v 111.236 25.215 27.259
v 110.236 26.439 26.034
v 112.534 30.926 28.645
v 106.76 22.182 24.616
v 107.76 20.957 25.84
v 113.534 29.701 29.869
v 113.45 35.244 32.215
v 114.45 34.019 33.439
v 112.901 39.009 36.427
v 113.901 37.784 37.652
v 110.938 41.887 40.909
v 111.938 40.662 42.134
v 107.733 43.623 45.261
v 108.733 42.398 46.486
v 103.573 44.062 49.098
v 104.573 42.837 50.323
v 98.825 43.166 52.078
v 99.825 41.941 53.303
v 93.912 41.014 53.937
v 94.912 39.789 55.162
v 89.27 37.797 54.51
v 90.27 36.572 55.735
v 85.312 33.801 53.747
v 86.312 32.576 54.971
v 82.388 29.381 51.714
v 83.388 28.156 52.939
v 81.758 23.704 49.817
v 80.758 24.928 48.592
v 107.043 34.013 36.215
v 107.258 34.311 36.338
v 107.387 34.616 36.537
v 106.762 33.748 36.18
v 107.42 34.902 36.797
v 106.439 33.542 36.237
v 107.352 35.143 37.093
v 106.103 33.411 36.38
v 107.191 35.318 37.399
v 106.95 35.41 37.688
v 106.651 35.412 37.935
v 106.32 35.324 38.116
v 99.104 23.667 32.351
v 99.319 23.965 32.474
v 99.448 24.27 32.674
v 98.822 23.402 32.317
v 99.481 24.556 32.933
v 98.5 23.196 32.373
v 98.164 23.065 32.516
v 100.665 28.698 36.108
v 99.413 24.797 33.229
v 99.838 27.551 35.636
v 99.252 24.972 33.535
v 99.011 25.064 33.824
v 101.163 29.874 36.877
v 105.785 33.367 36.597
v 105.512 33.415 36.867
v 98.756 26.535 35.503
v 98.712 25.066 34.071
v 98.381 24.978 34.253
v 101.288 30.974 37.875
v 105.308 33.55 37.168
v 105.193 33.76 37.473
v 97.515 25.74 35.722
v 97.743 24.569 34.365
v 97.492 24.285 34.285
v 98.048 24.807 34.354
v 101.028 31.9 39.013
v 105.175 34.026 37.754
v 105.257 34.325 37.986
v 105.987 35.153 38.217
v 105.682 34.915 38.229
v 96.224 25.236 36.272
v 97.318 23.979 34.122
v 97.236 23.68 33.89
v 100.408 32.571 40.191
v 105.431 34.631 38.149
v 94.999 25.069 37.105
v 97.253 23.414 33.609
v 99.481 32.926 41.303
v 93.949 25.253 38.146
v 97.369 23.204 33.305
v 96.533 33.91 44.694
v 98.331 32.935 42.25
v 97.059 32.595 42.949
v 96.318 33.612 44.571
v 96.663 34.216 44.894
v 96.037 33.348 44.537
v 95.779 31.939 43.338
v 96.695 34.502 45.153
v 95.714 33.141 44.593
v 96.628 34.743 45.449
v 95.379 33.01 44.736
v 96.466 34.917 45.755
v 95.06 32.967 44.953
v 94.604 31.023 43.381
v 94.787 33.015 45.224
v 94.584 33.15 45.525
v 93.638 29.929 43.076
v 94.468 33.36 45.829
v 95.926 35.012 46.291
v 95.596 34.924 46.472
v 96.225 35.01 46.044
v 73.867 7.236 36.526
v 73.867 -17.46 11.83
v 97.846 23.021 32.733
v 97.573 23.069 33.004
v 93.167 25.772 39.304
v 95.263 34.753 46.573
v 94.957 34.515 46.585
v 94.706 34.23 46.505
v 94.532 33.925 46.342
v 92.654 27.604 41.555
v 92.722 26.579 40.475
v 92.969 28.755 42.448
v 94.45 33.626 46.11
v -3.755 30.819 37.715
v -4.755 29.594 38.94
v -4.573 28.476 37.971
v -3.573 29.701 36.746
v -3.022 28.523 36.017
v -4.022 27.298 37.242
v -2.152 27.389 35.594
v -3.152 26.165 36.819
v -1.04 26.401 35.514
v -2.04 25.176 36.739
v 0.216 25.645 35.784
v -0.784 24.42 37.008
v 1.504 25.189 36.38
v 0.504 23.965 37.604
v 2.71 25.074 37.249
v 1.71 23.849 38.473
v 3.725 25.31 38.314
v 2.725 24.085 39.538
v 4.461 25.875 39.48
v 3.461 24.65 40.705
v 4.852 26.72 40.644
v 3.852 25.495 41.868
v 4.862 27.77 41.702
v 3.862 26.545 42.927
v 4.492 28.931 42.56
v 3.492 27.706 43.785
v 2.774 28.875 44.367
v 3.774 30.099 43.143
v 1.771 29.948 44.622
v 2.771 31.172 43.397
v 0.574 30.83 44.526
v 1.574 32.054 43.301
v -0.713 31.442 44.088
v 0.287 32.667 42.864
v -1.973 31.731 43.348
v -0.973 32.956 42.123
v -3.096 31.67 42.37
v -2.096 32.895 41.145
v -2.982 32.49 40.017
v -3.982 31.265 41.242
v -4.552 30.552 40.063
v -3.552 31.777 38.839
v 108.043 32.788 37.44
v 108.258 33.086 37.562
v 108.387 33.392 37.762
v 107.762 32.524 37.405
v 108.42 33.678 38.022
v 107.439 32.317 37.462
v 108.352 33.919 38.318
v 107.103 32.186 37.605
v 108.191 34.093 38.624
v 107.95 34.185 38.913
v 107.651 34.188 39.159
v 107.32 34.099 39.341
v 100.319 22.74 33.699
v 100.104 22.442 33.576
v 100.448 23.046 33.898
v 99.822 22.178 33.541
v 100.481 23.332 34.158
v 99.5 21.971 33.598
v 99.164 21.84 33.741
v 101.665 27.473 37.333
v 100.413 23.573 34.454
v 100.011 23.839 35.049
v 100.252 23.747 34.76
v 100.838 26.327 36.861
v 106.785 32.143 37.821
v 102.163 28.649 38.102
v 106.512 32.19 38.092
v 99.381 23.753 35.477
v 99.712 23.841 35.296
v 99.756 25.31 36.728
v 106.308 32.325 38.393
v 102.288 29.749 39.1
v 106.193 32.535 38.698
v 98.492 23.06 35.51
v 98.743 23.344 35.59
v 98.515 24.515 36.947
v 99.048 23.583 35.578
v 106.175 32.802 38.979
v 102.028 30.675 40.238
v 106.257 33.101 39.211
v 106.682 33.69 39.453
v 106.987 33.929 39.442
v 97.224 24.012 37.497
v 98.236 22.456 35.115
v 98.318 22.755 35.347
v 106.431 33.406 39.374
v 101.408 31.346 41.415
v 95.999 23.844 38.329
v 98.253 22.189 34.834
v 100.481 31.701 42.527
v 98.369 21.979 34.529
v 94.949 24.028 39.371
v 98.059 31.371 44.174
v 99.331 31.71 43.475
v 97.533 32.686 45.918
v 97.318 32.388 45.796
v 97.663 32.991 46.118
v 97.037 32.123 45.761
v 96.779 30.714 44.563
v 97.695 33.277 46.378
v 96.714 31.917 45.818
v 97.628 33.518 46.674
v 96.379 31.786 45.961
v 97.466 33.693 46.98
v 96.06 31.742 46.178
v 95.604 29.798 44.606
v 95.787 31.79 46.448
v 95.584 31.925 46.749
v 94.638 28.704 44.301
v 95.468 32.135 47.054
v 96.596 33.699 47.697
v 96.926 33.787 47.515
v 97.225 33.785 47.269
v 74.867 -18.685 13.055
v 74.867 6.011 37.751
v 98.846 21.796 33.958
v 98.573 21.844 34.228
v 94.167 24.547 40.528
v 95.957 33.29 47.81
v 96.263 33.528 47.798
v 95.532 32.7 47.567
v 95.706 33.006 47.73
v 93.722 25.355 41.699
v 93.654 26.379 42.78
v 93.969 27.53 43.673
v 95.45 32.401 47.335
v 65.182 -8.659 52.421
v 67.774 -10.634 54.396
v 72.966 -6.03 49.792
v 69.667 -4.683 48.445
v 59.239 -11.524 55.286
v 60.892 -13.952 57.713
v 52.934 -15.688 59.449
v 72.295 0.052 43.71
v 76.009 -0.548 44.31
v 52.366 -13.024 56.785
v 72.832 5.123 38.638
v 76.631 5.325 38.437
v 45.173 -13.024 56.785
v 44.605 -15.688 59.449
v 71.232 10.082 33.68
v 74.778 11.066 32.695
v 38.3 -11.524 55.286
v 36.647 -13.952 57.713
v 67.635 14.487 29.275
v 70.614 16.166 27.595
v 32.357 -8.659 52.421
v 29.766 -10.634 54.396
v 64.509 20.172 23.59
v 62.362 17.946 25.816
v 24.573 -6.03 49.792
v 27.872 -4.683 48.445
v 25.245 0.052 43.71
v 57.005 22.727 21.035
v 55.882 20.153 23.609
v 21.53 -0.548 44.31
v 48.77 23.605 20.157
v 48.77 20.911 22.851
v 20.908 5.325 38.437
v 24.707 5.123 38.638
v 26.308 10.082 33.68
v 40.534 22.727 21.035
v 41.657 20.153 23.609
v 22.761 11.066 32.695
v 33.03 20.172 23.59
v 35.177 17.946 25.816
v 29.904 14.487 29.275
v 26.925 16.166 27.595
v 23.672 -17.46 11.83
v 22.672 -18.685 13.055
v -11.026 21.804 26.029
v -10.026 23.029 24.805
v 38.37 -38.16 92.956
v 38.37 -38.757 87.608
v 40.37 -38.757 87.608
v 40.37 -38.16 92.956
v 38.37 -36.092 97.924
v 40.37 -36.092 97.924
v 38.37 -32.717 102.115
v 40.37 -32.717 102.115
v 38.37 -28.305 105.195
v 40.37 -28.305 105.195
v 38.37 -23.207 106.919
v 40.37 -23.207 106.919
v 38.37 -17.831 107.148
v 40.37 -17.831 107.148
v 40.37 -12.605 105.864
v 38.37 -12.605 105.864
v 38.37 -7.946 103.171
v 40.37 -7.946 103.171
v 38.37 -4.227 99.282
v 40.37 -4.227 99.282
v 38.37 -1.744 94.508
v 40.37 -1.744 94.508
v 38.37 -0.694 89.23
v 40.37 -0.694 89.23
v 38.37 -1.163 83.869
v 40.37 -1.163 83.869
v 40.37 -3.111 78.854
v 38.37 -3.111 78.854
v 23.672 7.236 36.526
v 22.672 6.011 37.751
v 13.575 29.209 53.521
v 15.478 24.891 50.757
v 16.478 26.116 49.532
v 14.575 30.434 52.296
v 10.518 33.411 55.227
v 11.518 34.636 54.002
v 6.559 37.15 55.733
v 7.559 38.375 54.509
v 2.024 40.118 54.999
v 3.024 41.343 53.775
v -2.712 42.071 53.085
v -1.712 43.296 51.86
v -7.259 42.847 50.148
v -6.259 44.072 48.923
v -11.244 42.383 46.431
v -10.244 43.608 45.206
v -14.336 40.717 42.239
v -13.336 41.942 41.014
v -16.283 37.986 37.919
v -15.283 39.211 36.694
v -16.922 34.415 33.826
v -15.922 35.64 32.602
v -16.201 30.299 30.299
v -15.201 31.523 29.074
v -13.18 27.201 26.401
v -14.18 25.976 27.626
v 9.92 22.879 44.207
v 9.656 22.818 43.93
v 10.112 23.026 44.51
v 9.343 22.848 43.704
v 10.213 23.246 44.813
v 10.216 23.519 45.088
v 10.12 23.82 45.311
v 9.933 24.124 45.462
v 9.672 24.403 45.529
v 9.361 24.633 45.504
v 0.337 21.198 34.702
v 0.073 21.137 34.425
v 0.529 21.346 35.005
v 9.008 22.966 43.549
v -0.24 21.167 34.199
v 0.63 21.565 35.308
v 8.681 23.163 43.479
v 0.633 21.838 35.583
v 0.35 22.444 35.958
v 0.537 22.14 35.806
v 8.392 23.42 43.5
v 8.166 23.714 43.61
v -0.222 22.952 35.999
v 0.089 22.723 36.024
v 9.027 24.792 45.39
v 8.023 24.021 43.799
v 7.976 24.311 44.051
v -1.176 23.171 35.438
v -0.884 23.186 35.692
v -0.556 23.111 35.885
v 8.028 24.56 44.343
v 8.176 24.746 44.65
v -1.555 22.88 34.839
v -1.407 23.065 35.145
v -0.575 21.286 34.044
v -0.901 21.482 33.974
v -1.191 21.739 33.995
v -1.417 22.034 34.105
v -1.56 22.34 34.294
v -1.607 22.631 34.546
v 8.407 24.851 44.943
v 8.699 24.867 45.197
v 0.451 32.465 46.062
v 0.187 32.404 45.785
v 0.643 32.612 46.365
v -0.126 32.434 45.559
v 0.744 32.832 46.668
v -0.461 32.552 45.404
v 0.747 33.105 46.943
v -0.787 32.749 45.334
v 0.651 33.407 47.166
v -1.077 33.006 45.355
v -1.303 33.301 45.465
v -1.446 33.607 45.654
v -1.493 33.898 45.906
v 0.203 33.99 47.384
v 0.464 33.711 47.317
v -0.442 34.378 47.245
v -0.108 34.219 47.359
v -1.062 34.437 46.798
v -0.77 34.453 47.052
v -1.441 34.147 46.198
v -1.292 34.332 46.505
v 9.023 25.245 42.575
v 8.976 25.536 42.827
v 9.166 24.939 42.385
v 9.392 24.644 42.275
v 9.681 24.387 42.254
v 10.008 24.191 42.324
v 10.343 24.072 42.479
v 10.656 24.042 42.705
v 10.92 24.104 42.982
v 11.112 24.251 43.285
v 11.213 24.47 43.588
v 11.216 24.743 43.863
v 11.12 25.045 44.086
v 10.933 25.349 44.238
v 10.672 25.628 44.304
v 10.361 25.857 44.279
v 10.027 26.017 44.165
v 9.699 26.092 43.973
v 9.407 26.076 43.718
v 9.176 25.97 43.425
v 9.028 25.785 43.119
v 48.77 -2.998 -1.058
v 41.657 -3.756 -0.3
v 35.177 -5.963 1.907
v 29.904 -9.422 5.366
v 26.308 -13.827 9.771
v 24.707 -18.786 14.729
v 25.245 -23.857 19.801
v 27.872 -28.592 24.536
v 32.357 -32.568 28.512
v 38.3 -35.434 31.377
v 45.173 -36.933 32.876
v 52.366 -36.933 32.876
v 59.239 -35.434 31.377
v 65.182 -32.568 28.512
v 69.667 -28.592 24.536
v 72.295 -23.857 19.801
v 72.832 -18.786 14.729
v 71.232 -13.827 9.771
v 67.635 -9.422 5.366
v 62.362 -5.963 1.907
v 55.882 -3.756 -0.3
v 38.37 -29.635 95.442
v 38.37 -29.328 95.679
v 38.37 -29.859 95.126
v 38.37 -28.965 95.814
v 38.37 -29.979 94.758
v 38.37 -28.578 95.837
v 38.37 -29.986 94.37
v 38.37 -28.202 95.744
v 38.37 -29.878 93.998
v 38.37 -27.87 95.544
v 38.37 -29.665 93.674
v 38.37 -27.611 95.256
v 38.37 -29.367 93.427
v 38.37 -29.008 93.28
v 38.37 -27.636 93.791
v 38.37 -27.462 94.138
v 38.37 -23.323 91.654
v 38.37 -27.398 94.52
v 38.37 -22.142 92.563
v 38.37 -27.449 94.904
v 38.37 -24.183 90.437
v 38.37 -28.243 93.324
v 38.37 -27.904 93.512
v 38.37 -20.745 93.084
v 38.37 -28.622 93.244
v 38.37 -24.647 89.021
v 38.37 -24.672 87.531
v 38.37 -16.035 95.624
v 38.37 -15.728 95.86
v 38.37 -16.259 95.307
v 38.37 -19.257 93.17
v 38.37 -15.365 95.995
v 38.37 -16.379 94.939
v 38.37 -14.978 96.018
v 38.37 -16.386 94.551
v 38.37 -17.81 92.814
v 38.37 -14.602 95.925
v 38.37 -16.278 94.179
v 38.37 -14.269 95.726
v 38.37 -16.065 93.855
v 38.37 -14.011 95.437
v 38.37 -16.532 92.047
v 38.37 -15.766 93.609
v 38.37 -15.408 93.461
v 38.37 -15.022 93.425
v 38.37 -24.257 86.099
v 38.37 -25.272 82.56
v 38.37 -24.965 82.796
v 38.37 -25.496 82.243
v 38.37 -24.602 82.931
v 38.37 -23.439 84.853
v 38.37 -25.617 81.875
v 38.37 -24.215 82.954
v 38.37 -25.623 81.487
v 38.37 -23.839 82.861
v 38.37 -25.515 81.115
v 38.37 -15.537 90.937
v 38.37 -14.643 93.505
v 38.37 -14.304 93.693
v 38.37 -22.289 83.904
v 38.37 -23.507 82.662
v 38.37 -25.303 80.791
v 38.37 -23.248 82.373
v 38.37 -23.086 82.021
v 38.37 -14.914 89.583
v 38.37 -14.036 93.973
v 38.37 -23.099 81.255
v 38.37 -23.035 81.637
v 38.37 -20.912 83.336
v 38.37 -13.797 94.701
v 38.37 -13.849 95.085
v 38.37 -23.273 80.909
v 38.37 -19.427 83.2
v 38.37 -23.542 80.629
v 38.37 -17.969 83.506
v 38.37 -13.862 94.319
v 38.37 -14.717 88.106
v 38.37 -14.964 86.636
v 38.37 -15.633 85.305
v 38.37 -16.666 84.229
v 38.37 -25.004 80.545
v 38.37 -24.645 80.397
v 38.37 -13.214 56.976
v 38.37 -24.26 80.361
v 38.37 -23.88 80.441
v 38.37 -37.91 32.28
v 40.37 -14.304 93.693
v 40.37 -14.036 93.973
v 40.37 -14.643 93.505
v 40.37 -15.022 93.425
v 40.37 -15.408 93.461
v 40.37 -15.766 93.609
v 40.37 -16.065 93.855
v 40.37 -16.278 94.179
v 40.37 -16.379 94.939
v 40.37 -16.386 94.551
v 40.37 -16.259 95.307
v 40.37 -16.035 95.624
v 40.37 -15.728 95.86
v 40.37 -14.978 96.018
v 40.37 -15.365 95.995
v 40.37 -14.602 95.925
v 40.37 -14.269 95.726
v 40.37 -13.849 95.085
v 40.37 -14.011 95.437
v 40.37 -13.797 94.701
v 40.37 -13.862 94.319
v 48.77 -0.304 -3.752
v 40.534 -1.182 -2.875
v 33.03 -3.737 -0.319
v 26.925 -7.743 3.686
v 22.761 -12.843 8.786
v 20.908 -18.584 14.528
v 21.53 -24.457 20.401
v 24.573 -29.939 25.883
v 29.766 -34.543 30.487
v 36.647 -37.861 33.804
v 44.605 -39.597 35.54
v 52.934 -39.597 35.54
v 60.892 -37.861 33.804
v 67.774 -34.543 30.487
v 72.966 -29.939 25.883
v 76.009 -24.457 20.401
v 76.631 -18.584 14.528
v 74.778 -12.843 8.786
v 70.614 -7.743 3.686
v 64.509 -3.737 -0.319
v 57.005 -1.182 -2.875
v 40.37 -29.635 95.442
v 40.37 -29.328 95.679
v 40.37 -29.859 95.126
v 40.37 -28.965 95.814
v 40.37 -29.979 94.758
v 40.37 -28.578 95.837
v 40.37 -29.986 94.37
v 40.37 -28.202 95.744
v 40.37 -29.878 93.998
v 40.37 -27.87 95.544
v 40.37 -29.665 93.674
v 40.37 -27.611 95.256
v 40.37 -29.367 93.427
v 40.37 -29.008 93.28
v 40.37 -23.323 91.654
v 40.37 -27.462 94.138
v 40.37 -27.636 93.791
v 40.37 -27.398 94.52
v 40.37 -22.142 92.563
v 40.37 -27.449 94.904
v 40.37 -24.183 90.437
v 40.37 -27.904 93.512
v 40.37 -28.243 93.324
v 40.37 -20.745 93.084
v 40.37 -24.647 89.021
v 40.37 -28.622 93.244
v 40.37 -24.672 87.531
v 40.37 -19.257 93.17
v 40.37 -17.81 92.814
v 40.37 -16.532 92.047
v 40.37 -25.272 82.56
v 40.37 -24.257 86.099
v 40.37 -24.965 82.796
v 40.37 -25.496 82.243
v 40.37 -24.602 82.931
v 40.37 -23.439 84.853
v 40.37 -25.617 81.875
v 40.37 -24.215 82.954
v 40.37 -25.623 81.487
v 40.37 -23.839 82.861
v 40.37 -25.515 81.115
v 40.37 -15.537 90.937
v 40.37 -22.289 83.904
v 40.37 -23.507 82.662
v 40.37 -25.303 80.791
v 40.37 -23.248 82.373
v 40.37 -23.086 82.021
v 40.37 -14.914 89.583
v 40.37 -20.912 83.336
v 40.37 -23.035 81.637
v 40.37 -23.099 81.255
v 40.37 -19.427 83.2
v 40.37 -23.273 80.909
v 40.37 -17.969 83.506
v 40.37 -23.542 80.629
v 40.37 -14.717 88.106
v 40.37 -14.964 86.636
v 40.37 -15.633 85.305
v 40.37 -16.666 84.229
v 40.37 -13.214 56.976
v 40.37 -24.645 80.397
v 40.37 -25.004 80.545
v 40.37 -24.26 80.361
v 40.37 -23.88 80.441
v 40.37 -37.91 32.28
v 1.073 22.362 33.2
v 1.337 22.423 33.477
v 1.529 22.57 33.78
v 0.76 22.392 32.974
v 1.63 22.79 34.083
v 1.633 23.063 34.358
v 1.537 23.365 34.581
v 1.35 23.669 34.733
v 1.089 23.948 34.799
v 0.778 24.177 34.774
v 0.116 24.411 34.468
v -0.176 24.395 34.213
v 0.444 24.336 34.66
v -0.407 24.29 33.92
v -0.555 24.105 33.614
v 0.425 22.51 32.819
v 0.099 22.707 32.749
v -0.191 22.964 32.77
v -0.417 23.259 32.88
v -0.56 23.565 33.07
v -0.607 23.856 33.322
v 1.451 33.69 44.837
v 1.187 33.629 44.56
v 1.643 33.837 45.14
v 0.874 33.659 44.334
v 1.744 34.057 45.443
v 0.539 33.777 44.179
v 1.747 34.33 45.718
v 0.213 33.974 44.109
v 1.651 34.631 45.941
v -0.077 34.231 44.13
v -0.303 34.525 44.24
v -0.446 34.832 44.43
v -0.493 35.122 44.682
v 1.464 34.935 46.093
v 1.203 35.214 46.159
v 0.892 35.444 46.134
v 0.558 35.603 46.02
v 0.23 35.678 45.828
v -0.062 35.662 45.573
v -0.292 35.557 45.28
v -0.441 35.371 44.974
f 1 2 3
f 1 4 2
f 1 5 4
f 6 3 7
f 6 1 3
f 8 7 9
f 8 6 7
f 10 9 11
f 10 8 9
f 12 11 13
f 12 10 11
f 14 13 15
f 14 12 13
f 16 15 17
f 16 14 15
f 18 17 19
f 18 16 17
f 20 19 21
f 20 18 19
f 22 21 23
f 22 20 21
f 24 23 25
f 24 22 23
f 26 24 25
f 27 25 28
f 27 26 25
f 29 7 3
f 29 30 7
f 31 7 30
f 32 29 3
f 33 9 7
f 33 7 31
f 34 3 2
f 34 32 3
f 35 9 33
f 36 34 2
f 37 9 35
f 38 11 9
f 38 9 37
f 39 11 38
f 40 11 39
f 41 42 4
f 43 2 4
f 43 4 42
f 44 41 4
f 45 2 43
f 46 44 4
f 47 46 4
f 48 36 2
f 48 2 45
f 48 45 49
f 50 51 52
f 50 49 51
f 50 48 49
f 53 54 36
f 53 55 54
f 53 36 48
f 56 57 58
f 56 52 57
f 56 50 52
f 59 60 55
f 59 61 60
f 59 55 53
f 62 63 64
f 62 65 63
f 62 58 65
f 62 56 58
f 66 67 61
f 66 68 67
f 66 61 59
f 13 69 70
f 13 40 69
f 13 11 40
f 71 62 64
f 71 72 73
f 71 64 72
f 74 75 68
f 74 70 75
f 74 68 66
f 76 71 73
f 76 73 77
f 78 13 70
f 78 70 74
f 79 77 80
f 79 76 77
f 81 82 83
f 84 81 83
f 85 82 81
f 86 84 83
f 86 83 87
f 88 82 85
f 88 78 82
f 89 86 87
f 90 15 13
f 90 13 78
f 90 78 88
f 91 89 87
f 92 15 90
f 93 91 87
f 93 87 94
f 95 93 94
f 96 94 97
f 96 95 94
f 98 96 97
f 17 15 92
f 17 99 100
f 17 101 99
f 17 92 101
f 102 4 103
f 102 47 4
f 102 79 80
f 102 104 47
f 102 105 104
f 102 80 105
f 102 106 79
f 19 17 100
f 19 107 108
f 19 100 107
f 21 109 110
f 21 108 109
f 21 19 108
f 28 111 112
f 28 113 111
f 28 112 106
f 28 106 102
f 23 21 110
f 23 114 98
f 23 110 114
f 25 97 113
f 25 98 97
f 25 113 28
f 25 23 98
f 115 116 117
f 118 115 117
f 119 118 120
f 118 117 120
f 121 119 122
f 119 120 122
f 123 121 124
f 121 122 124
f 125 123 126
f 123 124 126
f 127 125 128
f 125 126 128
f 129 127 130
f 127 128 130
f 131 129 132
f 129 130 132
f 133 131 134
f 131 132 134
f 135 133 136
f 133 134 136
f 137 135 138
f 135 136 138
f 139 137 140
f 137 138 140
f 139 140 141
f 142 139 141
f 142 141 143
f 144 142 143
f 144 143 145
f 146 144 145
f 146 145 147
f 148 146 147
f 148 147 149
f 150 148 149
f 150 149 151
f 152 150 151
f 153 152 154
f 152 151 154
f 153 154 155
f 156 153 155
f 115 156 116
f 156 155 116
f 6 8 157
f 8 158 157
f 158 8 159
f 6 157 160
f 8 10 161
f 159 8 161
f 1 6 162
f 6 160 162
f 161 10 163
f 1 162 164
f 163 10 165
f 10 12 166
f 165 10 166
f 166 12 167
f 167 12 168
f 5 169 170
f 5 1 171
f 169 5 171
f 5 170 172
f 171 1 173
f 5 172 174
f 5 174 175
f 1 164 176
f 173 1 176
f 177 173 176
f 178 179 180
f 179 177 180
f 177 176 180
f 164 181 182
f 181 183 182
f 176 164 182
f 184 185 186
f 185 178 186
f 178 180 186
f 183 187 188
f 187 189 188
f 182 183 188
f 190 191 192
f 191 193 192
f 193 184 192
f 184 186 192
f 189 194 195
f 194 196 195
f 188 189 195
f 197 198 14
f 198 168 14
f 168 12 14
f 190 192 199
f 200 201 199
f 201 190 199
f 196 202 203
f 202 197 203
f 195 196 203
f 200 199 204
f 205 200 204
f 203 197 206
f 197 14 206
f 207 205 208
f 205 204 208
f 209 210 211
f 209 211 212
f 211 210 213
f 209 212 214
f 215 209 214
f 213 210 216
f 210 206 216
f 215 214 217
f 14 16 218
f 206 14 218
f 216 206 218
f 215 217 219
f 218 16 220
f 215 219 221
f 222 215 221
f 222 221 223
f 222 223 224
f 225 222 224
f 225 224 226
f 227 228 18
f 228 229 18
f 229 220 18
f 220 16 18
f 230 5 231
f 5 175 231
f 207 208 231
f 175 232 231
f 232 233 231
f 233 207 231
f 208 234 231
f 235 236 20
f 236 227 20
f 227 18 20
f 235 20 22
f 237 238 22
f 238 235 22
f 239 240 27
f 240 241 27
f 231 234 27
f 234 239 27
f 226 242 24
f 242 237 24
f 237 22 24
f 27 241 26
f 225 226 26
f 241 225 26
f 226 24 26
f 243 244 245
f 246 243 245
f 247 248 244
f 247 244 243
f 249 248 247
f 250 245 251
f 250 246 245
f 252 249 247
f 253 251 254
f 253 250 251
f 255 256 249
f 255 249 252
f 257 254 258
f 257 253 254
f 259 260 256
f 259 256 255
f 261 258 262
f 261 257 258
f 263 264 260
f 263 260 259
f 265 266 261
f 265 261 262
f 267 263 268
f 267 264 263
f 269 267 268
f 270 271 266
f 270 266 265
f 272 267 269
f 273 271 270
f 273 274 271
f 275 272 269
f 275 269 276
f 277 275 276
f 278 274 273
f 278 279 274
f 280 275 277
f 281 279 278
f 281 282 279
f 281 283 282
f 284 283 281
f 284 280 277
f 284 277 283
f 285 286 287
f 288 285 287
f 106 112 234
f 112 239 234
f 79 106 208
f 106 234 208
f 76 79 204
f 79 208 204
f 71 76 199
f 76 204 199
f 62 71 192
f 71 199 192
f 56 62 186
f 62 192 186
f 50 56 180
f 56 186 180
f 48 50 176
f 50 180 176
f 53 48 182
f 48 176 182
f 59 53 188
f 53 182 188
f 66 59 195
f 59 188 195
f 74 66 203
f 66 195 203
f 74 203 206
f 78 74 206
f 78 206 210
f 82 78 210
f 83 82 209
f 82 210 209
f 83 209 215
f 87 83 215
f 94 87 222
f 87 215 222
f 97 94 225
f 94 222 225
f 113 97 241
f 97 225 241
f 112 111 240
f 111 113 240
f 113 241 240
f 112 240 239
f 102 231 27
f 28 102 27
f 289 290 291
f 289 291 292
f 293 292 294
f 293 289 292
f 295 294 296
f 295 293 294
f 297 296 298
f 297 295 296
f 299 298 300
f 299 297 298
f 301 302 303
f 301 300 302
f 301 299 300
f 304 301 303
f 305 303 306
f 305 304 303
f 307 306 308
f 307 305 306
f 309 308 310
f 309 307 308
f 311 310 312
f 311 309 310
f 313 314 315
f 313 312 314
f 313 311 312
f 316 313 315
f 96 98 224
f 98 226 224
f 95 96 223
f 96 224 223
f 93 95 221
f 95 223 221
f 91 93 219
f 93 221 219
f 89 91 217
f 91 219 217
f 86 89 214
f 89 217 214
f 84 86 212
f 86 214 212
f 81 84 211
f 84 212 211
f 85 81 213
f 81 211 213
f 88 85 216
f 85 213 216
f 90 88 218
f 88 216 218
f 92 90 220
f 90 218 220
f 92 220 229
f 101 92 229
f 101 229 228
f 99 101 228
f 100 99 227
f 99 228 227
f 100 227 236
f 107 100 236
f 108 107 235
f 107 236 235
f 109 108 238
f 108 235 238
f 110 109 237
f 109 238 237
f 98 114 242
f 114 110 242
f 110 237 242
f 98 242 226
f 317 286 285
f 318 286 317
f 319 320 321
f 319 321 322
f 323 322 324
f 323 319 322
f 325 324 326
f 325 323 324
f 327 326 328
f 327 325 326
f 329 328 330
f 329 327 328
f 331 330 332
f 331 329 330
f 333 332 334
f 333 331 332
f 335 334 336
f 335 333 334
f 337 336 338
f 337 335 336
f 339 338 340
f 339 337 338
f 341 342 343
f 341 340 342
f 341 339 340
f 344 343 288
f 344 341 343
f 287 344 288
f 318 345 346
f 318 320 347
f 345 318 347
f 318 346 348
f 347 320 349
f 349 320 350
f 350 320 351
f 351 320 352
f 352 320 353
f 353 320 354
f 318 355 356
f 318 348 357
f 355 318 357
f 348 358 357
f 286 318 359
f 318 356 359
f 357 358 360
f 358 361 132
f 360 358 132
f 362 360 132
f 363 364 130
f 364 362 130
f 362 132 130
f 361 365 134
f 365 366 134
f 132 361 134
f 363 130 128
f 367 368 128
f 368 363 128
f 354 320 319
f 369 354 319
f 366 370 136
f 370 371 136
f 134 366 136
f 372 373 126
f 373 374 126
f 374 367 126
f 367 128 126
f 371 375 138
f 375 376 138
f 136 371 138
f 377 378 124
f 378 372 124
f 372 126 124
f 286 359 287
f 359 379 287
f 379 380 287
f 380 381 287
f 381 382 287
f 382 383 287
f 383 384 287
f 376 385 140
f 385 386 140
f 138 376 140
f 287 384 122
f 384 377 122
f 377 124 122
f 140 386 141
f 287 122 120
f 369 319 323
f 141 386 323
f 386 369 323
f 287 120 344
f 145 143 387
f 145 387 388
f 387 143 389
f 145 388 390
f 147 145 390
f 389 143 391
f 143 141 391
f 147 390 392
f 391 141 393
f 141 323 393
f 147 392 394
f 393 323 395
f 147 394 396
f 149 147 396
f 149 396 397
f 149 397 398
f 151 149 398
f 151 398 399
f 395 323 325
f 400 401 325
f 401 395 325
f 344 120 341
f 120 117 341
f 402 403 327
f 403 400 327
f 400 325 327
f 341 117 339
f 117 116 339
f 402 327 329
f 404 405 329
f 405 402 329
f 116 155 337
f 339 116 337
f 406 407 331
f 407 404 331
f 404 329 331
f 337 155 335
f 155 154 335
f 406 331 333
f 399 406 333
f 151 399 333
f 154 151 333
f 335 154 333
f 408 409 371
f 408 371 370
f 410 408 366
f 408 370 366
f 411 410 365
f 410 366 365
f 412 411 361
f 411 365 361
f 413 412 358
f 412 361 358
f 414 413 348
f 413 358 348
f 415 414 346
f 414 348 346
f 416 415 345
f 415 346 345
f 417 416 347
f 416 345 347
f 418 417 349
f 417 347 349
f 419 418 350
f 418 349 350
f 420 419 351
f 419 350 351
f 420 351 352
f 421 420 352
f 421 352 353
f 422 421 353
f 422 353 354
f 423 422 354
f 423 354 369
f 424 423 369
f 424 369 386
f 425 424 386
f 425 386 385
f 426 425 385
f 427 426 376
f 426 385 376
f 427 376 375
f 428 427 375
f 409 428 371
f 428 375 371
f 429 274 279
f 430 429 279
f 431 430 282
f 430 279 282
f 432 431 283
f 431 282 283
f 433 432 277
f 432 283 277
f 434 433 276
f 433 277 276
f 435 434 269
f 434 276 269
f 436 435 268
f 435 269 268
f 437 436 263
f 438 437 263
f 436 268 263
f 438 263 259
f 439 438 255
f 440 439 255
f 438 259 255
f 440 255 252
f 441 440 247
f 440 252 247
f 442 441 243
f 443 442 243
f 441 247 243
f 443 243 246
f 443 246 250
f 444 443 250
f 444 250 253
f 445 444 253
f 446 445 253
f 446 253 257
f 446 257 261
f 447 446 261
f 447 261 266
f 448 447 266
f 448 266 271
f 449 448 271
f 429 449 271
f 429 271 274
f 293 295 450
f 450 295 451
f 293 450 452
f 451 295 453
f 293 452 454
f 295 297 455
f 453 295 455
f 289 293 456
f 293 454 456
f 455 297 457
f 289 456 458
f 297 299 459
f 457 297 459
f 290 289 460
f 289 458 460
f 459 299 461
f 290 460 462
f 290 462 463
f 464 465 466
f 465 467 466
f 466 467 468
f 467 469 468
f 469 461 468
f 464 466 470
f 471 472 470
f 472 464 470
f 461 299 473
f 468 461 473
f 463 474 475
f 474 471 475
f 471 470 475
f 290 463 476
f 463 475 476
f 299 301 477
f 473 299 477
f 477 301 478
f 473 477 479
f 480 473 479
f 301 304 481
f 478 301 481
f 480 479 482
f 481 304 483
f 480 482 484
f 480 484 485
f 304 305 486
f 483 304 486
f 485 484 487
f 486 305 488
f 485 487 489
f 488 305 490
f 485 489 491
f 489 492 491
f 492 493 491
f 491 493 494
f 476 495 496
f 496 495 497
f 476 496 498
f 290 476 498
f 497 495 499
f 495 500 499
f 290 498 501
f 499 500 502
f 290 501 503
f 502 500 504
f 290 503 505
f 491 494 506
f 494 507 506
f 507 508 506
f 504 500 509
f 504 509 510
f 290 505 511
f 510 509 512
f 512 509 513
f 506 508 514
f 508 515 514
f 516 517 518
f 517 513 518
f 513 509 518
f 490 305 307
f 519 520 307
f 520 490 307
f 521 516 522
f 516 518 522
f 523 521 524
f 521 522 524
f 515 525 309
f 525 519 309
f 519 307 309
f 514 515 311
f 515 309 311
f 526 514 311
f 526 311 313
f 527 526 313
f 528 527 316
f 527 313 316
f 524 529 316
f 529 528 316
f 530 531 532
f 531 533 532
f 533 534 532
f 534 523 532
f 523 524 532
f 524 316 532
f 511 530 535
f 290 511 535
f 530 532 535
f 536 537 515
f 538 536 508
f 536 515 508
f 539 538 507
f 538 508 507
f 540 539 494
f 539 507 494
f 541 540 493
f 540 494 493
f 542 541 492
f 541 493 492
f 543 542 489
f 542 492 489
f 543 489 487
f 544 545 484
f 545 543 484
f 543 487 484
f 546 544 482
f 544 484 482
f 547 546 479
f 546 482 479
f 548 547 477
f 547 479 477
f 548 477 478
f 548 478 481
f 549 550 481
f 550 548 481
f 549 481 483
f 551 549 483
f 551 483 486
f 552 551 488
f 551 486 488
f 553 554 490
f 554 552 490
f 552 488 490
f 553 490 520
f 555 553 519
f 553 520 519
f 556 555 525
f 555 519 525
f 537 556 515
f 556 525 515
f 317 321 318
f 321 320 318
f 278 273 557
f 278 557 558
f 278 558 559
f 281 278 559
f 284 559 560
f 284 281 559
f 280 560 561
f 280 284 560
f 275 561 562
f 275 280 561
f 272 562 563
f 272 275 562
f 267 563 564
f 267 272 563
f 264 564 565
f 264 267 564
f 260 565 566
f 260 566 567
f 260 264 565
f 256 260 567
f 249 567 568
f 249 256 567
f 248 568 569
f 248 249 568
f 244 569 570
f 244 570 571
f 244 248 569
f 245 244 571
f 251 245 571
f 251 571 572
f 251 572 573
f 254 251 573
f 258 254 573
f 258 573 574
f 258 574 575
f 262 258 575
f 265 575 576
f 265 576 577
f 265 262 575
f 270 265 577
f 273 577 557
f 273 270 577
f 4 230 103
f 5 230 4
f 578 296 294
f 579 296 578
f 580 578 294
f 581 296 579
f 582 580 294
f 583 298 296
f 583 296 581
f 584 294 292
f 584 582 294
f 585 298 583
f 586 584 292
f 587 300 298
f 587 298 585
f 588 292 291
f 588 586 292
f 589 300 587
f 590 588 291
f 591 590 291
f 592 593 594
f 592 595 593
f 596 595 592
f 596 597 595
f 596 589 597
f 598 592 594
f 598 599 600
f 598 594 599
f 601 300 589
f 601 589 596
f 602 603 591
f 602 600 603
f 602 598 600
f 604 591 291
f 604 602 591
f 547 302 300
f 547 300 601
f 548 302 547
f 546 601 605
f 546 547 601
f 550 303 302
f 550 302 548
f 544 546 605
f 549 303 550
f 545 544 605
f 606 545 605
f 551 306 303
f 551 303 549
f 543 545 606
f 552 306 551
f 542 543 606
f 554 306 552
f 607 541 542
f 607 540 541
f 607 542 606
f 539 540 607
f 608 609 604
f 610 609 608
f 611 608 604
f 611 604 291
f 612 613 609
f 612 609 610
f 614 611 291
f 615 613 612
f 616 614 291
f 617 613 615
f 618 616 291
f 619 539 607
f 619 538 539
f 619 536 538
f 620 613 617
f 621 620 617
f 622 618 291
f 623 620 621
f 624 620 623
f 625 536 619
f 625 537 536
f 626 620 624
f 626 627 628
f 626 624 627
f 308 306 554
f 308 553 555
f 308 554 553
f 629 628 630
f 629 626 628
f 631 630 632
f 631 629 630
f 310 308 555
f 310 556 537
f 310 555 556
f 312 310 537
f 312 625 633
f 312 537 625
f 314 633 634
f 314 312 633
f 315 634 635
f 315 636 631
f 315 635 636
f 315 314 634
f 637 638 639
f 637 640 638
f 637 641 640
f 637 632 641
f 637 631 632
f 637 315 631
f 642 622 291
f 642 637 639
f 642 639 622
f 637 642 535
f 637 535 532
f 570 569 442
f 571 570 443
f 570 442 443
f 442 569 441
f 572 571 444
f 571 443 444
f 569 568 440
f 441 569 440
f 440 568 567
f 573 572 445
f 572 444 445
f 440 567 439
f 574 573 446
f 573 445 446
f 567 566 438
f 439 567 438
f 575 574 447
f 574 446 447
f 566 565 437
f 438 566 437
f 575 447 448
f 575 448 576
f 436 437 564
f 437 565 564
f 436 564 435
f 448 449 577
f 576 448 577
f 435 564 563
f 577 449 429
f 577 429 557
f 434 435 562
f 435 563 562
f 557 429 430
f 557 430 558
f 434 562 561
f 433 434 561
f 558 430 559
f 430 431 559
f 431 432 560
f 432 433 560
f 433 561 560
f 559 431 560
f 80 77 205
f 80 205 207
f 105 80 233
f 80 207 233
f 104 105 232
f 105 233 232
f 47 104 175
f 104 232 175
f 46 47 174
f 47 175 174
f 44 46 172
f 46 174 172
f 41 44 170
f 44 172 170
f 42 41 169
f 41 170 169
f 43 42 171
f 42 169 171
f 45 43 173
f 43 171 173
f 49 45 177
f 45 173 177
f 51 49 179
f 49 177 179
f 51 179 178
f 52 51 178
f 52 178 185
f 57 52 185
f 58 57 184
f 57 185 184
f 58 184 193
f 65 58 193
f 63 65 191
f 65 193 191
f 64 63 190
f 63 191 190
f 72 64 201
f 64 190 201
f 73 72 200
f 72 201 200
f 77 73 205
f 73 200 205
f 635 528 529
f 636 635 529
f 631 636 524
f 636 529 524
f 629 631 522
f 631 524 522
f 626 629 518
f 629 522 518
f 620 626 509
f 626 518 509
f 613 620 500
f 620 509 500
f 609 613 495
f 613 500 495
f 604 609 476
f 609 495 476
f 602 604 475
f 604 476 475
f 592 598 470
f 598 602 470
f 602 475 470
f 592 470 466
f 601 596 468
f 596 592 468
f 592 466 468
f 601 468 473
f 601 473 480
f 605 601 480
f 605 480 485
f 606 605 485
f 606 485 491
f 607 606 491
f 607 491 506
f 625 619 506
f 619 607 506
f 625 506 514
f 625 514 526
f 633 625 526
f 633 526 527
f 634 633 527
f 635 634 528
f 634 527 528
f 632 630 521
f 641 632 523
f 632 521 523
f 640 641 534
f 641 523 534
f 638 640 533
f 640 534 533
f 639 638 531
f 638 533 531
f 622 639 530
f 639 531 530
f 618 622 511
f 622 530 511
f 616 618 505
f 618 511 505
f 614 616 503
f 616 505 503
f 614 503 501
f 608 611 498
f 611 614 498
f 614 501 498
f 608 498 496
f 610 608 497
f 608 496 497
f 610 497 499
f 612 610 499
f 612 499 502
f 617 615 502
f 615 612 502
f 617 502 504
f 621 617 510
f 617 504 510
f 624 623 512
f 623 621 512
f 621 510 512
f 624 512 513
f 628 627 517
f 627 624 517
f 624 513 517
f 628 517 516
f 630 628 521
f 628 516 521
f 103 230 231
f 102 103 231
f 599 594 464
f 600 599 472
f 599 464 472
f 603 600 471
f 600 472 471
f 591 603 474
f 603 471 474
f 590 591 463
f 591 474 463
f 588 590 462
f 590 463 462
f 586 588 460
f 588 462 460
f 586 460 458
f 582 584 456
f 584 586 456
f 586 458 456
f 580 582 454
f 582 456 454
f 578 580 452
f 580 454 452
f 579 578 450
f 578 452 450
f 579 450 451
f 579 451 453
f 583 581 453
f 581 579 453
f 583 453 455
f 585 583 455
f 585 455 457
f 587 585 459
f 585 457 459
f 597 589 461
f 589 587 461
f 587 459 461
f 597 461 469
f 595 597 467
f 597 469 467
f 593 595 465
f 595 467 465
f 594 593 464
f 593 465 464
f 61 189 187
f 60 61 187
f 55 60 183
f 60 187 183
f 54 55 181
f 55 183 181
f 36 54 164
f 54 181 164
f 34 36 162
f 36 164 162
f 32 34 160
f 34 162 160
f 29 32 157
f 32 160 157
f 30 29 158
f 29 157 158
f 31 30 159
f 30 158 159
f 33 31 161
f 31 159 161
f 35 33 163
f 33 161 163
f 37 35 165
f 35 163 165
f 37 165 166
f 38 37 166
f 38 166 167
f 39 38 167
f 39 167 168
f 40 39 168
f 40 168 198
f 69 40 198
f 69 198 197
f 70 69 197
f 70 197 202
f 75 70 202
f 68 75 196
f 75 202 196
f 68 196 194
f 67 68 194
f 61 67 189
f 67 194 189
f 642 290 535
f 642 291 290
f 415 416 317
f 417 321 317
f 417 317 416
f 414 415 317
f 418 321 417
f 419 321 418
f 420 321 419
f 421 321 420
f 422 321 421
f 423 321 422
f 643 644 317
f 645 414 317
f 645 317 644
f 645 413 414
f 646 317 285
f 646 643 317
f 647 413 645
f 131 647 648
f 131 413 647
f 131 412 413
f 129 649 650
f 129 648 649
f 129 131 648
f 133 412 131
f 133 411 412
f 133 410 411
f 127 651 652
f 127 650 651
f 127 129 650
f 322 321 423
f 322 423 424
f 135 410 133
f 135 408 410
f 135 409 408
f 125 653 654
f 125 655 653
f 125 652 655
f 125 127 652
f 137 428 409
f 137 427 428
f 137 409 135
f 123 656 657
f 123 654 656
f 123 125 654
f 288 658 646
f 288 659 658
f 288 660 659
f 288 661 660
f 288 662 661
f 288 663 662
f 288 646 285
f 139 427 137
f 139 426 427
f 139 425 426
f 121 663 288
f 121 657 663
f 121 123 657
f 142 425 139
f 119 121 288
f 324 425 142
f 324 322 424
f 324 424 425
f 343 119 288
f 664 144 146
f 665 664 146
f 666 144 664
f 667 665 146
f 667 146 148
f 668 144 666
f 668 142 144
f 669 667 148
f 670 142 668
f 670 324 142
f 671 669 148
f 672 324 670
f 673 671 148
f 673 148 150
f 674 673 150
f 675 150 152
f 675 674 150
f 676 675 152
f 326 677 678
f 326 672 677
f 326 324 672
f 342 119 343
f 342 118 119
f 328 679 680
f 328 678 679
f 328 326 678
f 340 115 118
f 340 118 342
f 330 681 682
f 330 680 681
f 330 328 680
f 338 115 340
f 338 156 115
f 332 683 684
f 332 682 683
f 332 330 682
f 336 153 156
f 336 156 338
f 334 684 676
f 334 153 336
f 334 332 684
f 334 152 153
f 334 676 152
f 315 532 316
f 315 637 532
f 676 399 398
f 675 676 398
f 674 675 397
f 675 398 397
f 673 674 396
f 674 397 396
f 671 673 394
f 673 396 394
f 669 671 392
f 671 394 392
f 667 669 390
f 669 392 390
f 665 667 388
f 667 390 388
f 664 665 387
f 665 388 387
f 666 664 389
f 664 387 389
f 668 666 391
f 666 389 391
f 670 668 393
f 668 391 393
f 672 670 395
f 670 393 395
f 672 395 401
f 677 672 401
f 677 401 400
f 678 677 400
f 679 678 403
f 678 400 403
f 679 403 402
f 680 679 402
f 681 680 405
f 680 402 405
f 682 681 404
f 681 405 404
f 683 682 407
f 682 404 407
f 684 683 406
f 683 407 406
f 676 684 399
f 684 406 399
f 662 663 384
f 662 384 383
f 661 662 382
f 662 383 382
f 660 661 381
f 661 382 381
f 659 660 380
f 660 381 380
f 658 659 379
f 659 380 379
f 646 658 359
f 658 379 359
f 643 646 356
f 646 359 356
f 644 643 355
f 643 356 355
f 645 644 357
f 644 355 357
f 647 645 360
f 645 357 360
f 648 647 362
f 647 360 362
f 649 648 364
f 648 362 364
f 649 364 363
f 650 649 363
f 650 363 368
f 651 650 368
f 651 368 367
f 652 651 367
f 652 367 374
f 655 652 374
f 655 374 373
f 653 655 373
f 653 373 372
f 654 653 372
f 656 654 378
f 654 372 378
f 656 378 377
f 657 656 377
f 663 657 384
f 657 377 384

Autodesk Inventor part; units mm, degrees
ref_plane "Work Plane2" through (-10.193577, 19.428351, 24.333337) normal (0.5, 0.6123724, -0.6123724) x (-0.8659961, 0.3593609, -0.3477219)
sketch "Sketch1" plane through (-10.193577, 19.428351, 24.333337) normal (0.5, 0.6123724, -0.6123724) x (-0.8659961, 0.3593609, -0.3477219)
  circle A0 centre (-11.136116, 17.567445) radius 13.35
  circle A1 centre (-11.136116, 9.567445) radius 1.3
  circle A2 centre (-11.136116, 25.567445) radius 1.3
  circle A3 centre (-22.136116, 17.567445) radius 1.3
  circle A4 centre (-11.136116, 17.567445) radius 5
  circle A5 centre (-11.136116, 17.567445) radius 19.05
  point P0 (-7.348153, -30.884757)
  dimension "d3" = 38.1
extrude "Extrusion1" add sketch "Sketch1" along normal blind 2 contours A0 | A5
ref_plane "Work Plane3" through (38.369556, -40.049097, 83.810785) normal (1, 0, 0) x (0, 0.8165027, -0.5773415)
ref_plane "Work Plane4" through (38.369556, -40.049097, 83.810785) normal (1, 0, 0) x (0, 0.8165027, -0.5773415)
sketch "Sketch2" plane through (38.369556, -40.049097, 83.810785) normal (1, 0, 0) x (0, 0.8165027, -0.5773415)
  circle A0 centre (14.07312, 15.315857) radius 13.35
  circle A1 centre (14.07312, 7.315857) radius 1.3
  circle A2 centre (14.07312, 23.315857) radius 1.3
  circle A3 centre (3.07312, 15.315857) radius 1.3
  circle A4 centre (14.07312, 15.315857) radius 5
  circle A5 centre (14.07312, 15.315857) radius 19.05
  point P0 (81.087646, -45.309729)
  dimension "d2" = 38.1
extrude "Extrusion2" add sketch "Sketch2" along normal blind 2 separate body contours A0 | A5
ref_plane "Work Plane5" through (77.39899, 56.579392, 52.285482) normal (0.5, -0.6123724, 0.6123724) x (0.7923994, 0.6088063, -0.038185)
sketch "Sketch4" plane through (0.575465, 29.021734, 39.45362) normal (0.5, 0.6123724, -0.6123724) x (-0.7745967, 0, -0.6324555)
  circle A0 centre (0, 0) radius 19.05 projected
  circle A1 centre (0, 0) radius 19.05 projected
  point P0 (25.398414, -41.435313)
sketch "Sketch8" plane through (-10.193577, 19.428351, 24.333337) normal (0.5, 0.6123724, -0.6123724) x (-0.8659961, 0.3593609, -0.3477219)
  circle A0 centre (-11.136116, 17.567445) radius 19.05
  line L0 (-29.456151, 22.790356) -> (-37.949033, 0.312331)
  line L1 (-38.236466, -34.611486) -> (2.996032, 4.79306)
  line L2 (-38.236466, -34.611486) -> (-37.949033, 0.312331)
  point P0 (-7.348153, -30.884757)
  point P1 (0.984757, 2.87095)
  point P2 (-30.144601, 16.31047)
ref_plane "Work Plane7" through (48.769556, 20.910804, 22.850885) normal (0, 0.7071068, 0.7071068) x (0, 0.7071068, -0.7071068)
sketch "Sketch11" plane through (48.769556, 20.910804, 22.850885) normal (0, 0.7071068, 0.7071068) x (0, 0.7071068, -0.7071068)
  circle A0 centre (-24.13, 0) radius 24.13 projected
  circle A1 centre (-24.13, 0) radius 27.94
  point P0 (1.371844, 48.769556)
  dimension "d19" = 55.88
extrude "Extrusion7" add sketch "Sketch11" against normal blind 33.812505 separate body
ref_plane "Work Plane8" through (97.963646, 27.796989, 40.678365) normal (-0.5, 0.6123724, -0.6123724) x (-0.8483483, -0.4884756, 0.2041979)
sketch "Sketch12" plane through (97.963646, 27.796989, 40.678365) normal (-0.5, 0.6123724, -0.6123724) x (-0.8483483, -0.4884756, 0.2041979)
  circle A0 centre (0, 0) radius 13.35 projected
  circle A1 centre (0, -8) radius 1.3 projected
  circle A2 centre (0, 8) radius 1.3 projected
  circle A3 centre (-11, 0) radius 1.3 projected
  circle A4 centre (0, 0) radius 5 projected
  circle A5 centre (0, 0) radius 19.05
  point P0 (88.379006, -31.292647)
  dimension "d24" = 38.1
extrude "Extrusion9" add sketch "Sketch12" along normal blind 2 separate body contours A0 | A5
sketch "Sketch13" plane through (97.963646, 27.796989, 40.678365) normal (-0.5, 0.6123724, -0.6123724) x (-0.8483483, -0.4884756, 0.2041979)
  line L0 (36.658828, -45.969558) -> (29.63839, -11.757439)
  line L1 (29.63839, -11.757439) -> (14.105649, 12.803639)
  circle A0 centre (0, 0) radius 19.05
  line L2 (36.658828, -45.969558) -> (-12.394751, -14.466259)
  point P0 (88.379006, -31.292647)
  point P1 (17.61391, 7.256217)
  point P2 (-7.999269, -17.289135)
extrude "Extrusion10" add sketch "Sketch13" along normal blind 2 separate body contours L2 A0 L1 L0
extrude "Extrusion11" add sketch "Sketch8" along normal blind 2 separate body contours A0 L1 L2 L0
sketch "Sketch14" plane through (40.369556, -19.715875, 88.191228) normal (1, 0, 0) x (0, 0, -1)
  line L0 (55.911075, -18.193999) -> (31.21537, 6.501705)
  line L1 (31.21537, 6.501705) -> (6.584901, 17.875726)
  circle A0 centre (0, 0) radius 19.05
  line L2 (55.911075, -18.193999) -> (0, -19.05)
  point P0 (88.191228, 19.715875)
  point P1 (9.33763, 16.604553)
  point P2 (0.583176, -19.041072)
sketch "Sketch14 outline for Extrusion12" plane through (40.369556, -19.715875, 88.191228) normal (1, 0, 0) x (0, 0, -1)
  line L0 (55.911075, -18.193999) -> (31.21537, 6.501705)
  line L1 (0.583176, -19.041072) -> (55.911075, -18.193999)
  arc A0 (9.33763, 16.604553) -> (0.583176, -19.041072) centre (0, 0) cw
  line L2 (31.21537, 6.501705) -> (9.33763, 16.604553)
extrude "Extrusion12" add sketch "Sketch14 outline for Extrusion12" against normal blind 2 separate body
combine bodies "Aleta Inferior" operation type add bodies to combine 7 2
combine bodies "AletaSuperiorIzq" operation type add bodies to combine 1 6
combine bodies "AletaSuperiorDer" operation type add bodies to combine 5 4
properties part number "Base3MotorsHead"
